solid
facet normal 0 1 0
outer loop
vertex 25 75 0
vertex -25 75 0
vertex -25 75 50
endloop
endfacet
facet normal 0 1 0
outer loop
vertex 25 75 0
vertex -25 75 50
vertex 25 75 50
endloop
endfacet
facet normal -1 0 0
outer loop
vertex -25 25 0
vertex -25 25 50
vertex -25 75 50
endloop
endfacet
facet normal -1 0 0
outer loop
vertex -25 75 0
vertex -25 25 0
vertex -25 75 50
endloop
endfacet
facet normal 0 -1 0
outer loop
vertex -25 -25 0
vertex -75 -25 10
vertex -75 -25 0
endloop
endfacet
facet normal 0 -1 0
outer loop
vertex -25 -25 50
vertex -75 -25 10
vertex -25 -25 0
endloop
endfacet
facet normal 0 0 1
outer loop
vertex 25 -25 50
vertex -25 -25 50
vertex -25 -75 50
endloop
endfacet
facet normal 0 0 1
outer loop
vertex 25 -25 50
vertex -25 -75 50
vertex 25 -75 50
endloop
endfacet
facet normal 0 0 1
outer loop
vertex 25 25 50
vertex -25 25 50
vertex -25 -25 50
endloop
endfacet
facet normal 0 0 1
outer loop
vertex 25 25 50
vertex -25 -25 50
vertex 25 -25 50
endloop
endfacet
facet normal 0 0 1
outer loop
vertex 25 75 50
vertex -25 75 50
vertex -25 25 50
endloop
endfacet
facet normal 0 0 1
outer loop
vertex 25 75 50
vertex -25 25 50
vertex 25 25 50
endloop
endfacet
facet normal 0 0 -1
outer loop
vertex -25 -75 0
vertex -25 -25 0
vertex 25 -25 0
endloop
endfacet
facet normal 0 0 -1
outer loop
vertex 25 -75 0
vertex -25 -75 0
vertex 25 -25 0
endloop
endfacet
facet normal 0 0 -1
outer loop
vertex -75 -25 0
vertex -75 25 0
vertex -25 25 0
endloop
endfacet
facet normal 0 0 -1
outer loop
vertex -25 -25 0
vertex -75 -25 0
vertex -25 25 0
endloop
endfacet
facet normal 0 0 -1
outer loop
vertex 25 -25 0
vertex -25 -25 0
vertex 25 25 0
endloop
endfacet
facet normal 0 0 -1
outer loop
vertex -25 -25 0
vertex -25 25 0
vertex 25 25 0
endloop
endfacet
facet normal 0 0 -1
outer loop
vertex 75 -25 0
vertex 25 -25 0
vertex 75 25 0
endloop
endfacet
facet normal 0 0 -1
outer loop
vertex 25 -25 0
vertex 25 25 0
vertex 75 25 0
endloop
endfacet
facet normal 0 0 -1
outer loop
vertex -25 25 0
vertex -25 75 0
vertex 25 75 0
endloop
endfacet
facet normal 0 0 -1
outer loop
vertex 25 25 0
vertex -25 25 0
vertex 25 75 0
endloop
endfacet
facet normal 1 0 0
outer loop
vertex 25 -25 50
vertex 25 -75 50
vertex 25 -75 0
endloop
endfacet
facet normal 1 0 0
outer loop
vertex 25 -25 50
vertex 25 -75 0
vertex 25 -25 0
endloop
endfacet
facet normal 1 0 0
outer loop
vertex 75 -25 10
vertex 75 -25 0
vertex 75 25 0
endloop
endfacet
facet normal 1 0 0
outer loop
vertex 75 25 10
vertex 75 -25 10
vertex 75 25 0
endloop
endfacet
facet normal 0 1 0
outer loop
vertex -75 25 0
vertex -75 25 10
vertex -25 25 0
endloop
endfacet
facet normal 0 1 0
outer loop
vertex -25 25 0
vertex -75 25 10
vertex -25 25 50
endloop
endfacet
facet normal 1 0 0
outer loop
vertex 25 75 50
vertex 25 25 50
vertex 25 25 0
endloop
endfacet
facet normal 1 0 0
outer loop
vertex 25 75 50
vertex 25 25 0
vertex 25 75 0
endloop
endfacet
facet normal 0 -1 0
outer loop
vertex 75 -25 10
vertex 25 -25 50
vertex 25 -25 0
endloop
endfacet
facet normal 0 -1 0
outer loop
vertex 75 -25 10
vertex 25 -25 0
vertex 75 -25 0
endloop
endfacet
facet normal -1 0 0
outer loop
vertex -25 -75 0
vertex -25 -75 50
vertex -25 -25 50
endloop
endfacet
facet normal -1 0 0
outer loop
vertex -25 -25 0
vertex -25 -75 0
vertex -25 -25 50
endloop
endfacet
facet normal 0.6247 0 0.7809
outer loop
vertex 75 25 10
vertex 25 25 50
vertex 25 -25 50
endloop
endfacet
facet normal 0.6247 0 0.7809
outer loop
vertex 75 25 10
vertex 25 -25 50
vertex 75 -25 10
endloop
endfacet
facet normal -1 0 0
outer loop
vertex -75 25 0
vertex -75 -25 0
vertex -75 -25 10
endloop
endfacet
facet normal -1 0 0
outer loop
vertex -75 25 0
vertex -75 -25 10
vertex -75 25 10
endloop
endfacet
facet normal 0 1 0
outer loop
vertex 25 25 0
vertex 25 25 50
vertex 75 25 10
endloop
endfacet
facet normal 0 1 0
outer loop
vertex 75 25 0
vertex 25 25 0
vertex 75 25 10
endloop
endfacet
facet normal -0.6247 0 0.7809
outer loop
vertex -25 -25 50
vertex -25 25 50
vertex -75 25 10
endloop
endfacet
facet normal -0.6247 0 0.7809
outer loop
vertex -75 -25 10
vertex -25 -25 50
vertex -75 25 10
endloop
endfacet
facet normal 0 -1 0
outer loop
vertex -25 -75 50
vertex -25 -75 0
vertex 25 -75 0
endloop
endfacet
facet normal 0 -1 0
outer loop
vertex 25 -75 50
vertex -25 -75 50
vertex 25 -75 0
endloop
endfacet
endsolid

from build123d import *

# Parameters (mm, degrees)
SKETCH1_W           = 150
SKETCH1_H           = 150
BOSS_EXTRUDE1_DEPTH = 50
SKETCH2_W           = 50
SKETCH2_H           = 50
CUT_EXTRUDE1_DEPTH  = 50
CUT_EXTRUDE2_DEPTH  = 50


with BuildPart() as part:
    # Sketch1 → Boss-Extrude1 (new body)
    with BuildSketch(Plane.XY):
        Rectangle(SKETCH1_W, SKETCH1_H)
    extrude(amount=BOSS_EXTRUDE1_DEPTH)

    # Sketch2 → Cut-Extrude1 (cut)
    with BuildSketch(Plane.XY.offset(50)):
        with Locations((-50, 50)):
            Rectangle(SKETCH2_W, SKETCH2_H)
        with Locations((50, 50)):
            Rectangle(SKETCH2_W, SKETCH2_H)
        with Locations((50, -50)):
            Rectangle(SKETCH2_W, SKETCH2_H)
        with Locations((-50, -50)):
            Rectangle(SKETCH2_W, SKETCH2_H)
    extrude(amount=-CUT_EXTRUDE1_DEPTH, mode=Mode.SUBTRACT)

    # Sketch3 → Cut-Extrude2 (cut)
    with BuildSketch(Plane(origin=(0, 25, 0), x_dir=(1, 0, 0), z_dir=(0, 1, 0))):
        Polygon((25, -50), (75, -10), (75, -50), align=None)
        Polygon((-75, -10), (-75, -50), (-25, -50), align=None)
    extrude(amount=-CUT_EXTRUDE2_DEPTH, mode=Mode.SUBTRACT)


solid = part.part
